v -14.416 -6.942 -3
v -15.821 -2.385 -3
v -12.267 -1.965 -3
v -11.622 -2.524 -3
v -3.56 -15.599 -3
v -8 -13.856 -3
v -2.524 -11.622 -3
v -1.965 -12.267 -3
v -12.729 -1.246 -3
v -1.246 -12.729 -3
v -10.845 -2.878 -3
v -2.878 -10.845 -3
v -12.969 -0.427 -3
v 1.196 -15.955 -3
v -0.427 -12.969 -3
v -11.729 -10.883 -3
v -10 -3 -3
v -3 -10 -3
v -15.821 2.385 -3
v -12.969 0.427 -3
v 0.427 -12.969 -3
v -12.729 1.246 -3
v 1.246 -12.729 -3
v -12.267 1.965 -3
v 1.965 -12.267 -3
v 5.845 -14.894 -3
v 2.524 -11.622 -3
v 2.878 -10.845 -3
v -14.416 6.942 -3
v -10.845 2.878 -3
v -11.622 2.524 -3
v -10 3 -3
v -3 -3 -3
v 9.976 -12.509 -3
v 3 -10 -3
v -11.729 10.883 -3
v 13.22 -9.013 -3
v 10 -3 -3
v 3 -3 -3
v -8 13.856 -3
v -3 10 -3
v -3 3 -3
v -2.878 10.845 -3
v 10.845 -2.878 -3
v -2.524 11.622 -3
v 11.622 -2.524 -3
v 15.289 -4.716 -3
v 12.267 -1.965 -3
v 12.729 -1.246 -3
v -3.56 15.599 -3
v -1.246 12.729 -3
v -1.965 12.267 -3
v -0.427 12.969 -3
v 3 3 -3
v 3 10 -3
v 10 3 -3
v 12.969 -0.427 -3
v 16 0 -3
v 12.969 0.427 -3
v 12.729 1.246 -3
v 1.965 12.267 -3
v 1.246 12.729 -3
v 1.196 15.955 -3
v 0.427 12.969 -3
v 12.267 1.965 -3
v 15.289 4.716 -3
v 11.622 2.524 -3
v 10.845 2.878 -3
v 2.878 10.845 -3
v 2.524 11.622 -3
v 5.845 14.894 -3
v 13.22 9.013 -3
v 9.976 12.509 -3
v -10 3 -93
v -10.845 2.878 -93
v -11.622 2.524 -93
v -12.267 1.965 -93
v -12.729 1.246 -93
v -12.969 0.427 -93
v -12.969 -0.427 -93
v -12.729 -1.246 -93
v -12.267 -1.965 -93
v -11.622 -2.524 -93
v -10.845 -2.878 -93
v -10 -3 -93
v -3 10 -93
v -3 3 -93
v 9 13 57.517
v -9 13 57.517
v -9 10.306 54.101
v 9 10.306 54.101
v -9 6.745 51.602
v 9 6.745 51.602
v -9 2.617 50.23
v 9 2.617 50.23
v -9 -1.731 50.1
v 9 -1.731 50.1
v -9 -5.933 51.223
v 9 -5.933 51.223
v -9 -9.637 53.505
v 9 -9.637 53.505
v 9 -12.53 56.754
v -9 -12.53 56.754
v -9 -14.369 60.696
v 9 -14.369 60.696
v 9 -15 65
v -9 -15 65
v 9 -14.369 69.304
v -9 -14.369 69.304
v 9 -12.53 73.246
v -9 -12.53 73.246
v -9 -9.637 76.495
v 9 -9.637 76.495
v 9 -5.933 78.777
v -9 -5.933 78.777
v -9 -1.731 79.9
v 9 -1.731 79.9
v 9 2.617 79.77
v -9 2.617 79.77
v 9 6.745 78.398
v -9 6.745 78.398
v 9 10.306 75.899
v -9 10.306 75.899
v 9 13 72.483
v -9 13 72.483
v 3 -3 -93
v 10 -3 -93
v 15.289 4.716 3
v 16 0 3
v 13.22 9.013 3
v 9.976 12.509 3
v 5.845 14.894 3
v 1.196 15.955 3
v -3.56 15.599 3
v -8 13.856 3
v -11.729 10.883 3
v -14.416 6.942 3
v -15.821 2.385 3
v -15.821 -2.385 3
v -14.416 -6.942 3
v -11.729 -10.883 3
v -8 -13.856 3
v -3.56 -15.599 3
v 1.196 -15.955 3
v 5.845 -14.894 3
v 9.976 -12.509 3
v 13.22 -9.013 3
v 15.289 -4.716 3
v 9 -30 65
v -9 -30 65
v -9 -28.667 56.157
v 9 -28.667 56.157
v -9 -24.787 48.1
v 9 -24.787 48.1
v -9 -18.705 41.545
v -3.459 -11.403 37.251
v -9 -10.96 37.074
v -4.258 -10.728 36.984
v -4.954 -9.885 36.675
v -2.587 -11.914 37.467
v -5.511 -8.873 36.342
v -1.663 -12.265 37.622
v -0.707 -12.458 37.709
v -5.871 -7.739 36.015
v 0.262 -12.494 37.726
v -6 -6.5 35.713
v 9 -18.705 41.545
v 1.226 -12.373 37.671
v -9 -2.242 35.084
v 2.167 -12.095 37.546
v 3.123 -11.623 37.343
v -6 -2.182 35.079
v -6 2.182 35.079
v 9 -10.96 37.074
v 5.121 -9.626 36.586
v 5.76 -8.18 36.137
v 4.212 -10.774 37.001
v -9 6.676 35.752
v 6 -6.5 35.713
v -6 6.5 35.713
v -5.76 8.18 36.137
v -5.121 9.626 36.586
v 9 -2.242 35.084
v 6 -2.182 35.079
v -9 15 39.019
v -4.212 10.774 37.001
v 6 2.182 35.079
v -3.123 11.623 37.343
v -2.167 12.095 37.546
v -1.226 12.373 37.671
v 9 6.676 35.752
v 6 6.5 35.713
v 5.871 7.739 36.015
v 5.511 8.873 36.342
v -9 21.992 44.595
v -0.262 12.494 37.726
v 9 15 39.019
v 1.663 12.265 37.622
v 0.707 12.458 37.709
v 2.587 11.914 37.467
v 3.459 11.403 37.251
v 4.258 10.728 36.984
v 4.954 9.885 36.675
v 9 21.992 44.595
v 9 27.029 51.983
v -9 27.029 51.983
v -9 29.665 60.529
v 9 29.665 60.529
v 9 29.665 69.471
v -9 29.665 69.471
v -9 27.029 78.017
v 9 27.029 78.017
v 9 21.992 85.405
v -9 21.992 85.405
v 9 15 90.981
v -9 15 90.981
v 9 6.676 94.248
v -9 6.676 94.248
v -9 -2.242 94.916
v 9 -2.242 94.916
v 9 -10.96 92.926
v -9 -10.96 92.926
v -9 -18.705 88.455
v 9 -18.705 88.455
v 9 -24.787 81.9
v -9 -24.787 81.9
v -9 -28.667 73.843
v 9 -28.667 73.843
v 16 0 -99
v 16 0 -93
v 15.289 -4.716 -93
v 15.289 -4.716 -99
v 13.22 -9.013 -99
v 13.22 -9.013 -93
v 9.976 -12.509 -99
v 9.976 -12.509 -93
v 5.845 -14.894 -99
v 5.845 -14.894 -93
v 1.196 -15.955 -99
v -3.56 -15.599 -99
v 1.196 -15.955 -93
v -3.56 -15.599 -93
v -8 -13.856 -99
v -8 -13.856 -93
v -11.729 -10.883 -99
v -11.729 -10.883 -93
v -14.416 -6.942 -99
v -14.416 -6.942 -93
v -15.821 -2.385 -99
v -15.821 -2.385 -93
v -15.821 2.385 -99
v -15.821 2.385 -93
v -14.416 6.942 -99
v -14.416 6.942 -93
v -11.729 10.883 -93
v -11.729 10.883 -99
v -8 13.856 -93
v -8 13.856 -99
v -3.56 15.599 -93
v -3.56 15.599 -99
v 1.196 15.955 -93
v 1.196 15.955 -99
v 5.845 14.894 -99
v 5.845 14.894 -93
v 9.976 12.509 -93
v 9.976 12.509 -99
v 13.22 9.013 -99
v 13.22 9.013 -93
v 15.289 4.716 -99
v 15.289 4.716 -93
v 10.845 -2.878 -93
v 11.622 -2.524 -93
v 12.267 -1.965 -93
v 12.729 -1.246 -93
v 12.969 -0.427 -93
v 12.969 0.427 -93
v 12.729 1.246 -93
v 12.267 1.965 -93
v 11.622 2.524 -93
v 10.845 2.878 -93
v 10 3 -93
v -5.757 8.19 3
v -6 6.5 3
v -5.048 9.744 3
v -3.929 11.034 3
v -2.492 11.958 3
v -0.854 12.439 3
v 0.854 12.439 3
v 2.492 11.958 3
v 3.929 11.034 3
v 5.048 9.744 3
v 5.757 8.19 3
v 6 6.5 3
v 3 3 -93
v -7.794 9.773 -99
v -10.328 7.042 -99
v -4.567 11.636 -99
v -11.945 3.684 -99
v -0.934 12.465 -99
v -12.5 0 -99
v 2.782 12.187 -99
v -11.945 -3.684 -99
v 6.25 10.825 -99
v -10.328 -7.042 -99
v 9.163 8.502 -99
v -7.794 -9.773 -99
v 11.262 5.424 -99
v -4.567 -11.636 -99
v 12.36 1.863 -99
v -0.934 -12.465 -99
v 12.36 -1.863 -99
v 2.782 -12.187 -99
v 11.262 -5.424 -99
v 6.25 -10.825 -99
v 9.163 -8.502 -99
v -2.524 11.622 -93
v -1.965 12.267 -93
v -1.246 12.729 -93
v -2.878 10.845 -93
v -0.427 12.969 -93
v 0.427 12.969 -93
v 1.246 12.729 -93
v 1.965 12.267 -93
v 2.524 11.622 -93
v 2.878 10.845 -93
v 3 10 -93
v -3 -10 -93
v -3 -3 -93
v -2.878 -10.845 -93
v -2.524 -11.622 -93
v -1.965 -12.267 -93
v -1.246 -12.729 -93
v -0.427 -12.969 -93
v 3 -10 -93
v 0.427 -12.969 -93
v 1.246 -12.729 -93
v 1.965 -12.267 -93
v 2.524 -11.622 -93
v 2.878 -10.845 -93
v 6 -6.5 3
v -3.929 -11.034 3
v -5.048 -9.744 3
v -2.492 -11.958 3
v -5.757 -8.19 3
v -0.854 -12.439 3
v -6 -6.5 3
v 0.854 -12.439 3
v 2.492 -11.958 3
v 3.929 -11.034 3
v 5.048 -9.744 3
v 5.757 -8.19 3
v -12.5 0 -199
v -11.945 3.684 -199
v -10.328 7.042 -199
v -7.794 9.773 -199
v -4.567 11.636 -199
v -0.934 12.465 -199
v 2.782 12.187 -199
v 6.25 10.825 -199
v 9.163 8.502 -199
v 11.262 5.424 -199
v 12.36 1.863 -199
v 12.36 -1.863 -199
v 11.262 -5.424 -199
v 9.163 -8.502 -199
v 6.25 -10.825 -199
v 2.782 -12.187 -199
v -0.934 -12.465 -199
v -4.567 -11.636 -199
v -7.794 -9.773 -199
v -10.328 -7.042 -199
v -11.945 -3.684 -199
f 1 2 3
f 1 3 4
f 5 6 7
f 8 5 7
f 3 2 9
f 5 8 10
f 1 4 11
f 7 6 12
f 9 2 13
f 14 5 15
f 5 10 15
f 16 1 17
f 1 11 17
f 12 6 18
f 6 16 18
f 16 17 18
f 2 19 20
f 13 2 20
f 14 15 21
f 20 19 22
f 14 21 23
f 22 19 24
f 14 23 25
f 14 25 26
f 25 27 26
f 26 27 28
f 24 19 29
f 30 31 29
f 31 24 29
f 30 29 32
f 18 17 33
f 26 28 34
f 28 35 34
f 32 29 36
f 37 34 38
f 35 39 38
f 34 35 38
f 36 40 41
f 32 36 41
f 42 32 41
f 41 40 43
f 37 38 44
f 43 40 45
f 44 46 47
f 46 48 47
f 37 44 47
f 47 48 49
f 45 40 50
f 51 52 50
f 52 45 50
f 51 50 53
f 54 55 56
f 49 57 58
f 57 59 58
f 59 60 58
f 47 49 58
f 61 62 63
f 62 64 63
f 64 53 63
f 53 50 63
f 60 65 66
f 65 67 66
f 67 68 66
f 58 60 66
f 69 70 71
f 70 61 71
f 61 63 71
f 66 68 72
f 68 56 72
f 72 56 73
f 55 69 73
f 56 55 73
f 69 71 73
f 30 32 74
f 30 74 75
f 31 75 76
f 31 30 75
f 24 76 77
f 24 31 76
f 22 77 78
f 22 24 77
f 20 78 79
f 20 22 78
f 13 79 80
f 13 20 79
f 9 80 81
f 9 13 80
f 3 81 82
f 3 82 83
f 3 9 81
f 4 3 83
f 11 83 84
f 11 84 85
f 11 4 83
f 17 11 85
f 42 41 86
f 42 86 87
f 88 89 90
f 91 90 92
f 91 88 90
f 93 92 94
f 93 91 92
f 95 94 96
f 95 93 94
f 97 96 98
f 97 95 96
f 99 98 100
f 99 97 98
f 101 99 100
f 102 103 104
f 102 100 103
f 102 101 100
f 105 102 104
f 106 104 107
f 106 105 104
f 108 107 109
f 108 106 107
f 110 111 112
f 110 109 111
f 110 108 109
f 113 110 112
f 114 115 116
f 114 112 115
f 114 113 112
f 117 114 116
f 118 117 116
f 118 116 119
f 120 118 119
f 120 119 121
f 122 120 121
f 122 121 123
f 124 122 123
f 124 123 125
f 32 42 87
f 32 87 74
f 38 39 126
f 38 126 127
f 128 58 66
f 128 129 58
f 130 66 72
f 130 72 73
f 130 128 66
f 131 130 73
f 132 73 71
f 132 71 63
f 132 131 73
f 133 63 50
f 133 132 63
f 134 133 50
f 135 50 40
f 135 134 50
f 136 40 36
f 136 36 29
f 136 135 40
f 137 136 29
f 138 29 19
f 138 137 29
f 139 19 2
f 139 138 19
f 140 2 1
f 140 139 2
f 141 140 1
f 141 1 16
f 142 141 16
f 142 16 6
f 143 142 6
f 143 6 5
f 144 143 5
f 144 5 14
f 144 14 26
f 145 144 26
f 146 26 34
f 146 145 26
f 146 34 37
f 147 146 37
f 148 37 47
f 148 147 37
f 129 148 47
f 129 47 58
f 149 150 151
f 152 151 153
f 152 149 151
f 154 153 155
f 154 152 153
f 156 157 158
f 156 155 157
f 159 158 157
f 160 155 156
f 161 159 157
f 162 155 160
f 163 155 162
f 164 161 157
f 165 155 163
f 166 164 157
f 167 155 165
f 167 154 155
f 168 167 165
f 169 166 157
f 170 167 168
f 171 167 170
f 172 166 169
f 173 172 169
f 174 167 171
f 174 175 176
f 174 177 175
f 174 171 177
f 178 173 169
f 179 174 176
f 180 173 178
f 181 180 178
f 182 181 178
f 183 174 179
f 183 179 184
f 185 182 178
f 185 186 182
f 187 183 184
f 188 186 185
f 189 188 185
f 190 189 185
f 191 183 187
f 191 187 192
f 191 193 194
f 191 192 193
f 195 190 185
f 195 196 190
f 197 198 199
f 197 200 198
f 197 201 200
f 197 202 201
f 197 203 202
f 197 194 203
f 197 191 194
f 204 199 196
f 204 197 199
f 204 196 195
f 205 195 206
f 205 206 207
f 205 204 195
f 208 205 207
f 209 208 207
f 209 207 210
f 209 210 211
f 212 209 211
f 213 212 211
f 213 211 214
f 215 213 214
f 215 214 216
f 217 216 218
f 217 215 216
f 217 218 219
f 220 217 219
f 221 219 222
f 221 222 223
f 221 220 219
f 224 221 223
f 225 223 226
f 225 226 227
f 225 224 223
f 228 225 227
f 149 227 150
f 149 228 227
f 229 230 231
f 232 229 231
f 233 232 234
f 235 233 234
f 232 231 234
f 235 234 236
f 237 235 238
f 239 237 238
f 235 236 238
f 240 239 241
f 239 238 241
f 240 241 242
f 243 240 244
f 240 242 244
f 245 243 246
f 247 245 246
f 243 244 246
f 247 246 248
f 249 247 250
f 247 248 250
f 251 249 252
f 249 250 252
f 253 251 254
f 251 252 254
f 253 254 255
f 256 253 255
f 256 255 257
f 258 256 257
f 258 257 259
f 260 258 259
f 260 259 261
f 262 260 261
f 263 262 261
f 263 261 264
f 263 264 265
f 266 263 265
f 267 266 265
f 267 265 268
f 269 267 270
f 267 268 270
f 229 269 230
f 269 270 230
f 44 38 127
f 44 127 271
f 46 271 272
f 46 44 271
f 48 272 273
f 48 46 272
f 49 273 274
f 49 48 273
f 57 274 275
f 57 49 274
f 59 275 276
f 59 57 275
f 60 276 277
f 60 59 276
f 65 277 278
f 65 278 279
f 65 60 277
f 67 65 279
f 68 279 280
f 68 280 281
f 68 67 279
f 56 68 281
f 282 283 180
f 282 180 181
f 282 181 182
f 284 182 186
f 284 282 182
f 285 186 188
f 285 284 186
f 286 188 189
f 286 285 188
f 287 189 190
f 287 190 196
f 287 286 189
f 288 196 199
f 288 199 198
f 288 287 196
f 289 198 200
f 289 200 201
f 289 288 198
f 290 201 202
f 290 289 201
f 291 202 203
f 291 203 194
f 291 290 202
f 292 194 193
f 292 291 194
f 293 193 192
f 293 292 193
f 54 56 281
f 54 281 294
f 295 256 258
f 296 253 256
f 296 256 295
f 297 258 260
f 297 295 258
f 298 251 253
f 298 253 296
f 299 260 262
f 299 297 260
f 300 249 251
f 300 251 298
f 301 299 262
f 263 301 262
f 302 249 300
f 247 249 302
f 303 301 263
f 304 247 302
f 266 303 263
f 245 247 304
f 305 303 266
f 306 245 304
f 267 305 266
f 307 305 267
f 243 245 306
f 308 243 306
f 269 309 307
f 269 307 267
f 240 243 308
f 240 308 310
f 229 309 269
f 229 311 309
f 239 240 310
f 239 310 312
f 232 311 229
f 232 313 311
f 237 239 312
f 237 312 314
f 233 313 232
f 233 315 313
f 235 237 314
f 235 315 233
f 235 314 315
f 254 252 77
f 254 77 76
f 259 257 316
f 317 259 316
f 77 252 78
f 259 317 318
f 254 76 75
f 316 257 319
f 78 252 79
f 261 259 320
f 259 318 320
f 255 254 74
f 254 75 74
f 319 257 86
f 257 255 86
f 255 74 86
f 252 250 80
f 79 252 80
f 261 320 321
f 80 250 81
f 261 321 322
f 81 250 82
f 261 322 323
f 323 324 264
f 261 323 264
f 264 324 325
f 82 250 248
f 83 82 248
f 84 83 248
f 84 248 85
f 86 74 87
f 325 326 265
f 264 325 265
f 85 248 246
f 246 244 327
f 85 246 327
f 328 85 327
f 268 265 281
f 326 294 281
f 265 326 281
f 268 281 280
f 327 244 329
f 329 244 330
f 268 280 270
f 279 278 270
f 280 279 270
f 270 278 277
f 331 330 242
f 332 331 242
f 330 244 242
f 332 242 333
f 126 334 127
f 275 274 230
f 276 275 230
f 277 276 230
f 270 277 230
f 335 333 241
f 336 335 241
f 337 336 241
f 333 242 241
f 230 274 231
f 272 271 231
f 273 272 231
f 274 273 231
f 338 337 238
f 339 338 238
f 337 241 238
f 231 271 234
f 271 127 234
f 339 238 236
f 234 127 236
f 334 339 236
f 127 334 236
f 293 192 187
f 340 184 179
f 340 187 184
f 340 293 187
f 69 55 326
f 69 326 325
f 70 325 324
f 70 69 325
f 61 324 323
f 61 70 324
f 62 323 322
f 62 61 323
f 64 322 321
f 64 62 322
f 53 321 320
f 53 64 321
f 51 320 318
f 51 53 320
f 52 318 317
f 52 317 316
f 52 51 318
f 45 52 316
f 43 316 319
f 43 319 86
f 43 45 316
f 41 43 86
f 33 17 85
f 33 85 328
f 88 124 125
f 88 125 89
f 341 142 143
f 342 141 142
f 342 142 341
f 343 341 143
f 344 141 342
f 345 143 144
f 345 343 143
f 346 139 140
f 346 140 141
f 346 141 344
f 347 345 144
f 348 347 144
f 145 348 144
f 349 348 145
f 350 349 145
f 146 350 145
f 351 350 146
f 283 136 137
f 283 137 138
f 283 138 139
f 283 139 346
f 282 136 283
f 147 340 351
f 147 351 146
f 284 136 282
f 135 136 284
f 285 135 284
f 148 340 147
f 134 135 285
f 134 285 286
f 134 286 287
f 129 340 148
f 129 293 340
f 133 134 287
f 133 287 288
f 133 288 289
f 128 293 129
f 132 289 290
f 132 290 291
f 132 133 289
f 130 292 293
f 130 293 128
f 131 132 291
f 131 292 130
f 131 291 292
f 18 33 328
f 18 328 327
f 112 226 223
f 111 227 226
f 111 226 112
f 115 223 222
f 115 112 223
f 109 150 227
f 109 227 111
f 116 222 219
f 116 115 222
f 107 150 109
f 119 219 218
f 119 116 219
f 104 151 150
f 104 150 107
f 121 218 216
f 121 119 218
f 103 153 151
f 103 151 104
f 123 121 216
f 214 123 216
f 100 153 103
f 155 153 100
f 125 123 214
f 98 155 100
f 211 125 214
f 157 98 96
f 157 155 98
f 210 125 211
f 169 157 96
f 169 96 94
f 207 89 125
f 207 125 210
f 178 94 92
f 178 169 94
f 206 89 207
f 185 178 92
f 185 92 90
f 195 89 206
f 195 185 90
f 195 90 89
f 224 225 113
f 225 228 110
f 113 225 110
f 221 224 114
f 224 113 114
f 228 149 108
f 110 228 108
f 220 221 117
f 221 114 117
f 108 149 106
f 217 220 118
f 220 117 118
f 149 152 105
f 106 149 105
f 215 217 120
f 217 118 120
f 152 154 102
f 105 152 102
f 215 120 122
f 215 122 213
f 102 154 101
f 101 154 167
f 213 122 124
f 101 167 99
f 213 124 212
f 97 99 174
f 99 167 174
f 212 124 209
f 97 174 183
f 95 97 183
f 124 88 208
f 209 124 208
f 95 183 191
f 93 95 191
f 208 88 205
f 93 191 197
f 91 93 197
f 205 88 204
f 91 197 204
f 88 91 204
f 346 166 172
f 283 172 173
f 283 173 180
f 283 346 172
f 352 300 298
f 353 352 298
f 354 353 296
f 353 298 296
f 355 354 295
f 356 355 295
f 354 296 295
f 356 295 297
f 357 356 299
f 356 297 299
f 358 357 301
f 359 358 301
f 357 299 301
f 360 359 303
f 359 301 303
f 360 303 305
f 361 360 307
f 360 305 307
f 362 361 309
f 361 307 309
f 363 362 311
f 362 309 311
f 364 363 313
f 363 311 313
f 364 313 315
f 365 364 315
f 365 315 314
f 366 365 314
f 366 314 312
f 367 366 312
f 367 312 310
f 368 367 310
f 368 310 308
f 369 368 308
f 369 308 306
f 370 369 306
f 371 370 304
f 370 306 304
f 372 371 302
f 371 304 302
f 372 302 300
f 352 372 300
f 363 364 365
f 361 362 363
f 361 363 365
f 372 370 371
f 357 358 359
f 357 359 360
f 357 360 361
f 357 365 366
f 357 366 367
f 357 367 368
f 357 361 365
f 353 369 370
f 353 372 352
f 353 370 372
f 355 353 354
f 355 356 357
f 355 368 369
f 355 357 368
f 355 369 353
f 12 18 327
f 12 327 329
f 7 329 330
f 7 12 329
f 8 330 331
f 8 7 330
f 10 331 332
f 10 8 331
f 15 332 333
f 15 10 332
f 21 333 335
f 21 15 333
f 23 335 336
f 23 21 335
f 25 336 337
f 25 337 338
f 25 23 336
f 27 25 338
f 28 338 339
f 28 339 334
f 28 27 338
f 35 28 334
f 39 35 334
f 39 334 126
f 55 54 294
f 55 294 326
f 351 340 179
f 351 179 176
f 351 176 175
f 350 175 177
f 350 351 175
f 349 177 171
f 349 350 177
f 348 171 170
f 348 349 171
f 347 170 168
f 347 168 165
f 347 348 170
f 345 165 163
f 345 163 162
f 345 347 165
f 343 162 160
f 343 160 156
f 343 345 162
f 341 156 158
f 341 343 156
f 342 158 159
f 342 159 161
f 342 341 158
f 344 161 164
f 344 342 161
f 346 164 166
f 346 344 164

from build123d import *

# Parameters (mm, degrees)
SKETCH1_R           = 16
BASE_EXTRUDE_DEPTH  = 3
EXTRUDE3_DEPTH      = 62
BOSS_EXTRUDE1_DEPTH = 90
SKETCH6_R           = 16
BOSS_EXTRUDE2_DEPTH = 6
SKETCH9_W           = 18
SKETCH9_H           = 30
CUT_EXTRUDE1_DEPTH  = 107.423681603
SKETCH7_R           = 12.5
EXTRUDE4_DEPTH      = 100


with BuildPart() as part:
    # Sketch1 → Base-Extrude (new, symmetric)
    with BuildSketch(Plane.XY):
        Circle(SKETCH1_R)
    extrude(amount=BASE_EXTRUDE_DEPTH, both=True)

    # Sketch2 → Extrude3 (add)
    with BuildSketch(Plane.XY.offset(3)):
        with BuildLine():
            Line((-6, -6.5), (-6, 6.5))
            ThreePointArc((-6, 6.5), (0, 12.5), (6, 6.5))
            Line((6, 6.5), (6, -6.5))
            ThreePointArc((6, -6.5), (0, -12.5), (-6, -6.5))
        make_face()
    extrude(amount=EXTRUDE3_DEPTH)

    # Sketch5 → Boss-Extrude1 (add)
    with BuildSketch(Plane(origin=(0, 0, -3), x_dir=(-1, 0, 0), z_dir=(0, 0, -1))):
        with BuildLine():
            Line((-3, 3), (-3, 10))
            ThreePointArc((-3, 10), (0, 13), (3, 10))
            Line((3, 10), (3, 3))
            Line((3, 3), (10, 3))
            ThreePointArc((10, 3), (13, 0), (10, -3))
            Line((10, -3), (3, -3))
            Line((3, -3), (3, -10))
            ThreePointArc((3, -10), (0, -13), (-3, -10))
            Line((-3, -10), (-3, -3))
            Line((-3, -3), (-10, -3))
            ThreePointArc((-10, -3), (-13, 0), (-10, 3))
            Line((-10, 3), (-3, 3))
        make_face()
    extrude(amount=BOSS_EXTRUDE1_DEPTH)

    # Sketch6 → Boss-Extrude2 (add)
    with BuildSketch(Plane(origin=(0, 0, -93), x_dir=(-1, 0, 0), z_dir=(0, 0, -1))):
        with Locations(Location((0, 0, 0), (0, 0, 180))):
            Circle(SKETCH6_R)
    extrude(amount=BOSS_EXTRUDE2_DEPTH)

    # Sketch9 → Boss-Revolve1 (revolve)
    with BuildSketch(Plane.XY.offset(65), mode=Mode.PRIVATE) as boss_revolve1_sk:
        with Locations((0, 15)):
            Rectangle(SKETCH9_W, SKETCH9_H)
    revolve(boss_revolve1_sk.sketch.rotate(Axis((9, 0, 65), (1, 0, 0)), 180), axis=Axis((9, 0, 65), (1, 0, 0)))

    # Sketch10 → Cut-Extrude1 (cut, through all)
    with BuildSketch(Plane(origin=(9, 0, 0), x_dir=(0, 0, -1), z_dir=(1, 0, 0))):
        with BuildLine():
            Line((-72.483314774, 13), (-57.516685226, 13))
            ThreePointArc((-57.516685226, 13), (-65, -15), (-72.483314774, 13))
        make_face()
    extrude(amount=-CUT_EXTRUDE1_DEPTH, mode=Mode.SUBTRACT)

    # Sketch7 → Extrude4 (add)
    with BuildSketch(Plane(origin=(0, 0, -99), x_dir=(-1, 0, 0), z_dir=(0, 0, -1))):
        Circle(SKETCH7_R)
    extrude(amount=EXTRUDE4_DEPTH)


solid = part.part
